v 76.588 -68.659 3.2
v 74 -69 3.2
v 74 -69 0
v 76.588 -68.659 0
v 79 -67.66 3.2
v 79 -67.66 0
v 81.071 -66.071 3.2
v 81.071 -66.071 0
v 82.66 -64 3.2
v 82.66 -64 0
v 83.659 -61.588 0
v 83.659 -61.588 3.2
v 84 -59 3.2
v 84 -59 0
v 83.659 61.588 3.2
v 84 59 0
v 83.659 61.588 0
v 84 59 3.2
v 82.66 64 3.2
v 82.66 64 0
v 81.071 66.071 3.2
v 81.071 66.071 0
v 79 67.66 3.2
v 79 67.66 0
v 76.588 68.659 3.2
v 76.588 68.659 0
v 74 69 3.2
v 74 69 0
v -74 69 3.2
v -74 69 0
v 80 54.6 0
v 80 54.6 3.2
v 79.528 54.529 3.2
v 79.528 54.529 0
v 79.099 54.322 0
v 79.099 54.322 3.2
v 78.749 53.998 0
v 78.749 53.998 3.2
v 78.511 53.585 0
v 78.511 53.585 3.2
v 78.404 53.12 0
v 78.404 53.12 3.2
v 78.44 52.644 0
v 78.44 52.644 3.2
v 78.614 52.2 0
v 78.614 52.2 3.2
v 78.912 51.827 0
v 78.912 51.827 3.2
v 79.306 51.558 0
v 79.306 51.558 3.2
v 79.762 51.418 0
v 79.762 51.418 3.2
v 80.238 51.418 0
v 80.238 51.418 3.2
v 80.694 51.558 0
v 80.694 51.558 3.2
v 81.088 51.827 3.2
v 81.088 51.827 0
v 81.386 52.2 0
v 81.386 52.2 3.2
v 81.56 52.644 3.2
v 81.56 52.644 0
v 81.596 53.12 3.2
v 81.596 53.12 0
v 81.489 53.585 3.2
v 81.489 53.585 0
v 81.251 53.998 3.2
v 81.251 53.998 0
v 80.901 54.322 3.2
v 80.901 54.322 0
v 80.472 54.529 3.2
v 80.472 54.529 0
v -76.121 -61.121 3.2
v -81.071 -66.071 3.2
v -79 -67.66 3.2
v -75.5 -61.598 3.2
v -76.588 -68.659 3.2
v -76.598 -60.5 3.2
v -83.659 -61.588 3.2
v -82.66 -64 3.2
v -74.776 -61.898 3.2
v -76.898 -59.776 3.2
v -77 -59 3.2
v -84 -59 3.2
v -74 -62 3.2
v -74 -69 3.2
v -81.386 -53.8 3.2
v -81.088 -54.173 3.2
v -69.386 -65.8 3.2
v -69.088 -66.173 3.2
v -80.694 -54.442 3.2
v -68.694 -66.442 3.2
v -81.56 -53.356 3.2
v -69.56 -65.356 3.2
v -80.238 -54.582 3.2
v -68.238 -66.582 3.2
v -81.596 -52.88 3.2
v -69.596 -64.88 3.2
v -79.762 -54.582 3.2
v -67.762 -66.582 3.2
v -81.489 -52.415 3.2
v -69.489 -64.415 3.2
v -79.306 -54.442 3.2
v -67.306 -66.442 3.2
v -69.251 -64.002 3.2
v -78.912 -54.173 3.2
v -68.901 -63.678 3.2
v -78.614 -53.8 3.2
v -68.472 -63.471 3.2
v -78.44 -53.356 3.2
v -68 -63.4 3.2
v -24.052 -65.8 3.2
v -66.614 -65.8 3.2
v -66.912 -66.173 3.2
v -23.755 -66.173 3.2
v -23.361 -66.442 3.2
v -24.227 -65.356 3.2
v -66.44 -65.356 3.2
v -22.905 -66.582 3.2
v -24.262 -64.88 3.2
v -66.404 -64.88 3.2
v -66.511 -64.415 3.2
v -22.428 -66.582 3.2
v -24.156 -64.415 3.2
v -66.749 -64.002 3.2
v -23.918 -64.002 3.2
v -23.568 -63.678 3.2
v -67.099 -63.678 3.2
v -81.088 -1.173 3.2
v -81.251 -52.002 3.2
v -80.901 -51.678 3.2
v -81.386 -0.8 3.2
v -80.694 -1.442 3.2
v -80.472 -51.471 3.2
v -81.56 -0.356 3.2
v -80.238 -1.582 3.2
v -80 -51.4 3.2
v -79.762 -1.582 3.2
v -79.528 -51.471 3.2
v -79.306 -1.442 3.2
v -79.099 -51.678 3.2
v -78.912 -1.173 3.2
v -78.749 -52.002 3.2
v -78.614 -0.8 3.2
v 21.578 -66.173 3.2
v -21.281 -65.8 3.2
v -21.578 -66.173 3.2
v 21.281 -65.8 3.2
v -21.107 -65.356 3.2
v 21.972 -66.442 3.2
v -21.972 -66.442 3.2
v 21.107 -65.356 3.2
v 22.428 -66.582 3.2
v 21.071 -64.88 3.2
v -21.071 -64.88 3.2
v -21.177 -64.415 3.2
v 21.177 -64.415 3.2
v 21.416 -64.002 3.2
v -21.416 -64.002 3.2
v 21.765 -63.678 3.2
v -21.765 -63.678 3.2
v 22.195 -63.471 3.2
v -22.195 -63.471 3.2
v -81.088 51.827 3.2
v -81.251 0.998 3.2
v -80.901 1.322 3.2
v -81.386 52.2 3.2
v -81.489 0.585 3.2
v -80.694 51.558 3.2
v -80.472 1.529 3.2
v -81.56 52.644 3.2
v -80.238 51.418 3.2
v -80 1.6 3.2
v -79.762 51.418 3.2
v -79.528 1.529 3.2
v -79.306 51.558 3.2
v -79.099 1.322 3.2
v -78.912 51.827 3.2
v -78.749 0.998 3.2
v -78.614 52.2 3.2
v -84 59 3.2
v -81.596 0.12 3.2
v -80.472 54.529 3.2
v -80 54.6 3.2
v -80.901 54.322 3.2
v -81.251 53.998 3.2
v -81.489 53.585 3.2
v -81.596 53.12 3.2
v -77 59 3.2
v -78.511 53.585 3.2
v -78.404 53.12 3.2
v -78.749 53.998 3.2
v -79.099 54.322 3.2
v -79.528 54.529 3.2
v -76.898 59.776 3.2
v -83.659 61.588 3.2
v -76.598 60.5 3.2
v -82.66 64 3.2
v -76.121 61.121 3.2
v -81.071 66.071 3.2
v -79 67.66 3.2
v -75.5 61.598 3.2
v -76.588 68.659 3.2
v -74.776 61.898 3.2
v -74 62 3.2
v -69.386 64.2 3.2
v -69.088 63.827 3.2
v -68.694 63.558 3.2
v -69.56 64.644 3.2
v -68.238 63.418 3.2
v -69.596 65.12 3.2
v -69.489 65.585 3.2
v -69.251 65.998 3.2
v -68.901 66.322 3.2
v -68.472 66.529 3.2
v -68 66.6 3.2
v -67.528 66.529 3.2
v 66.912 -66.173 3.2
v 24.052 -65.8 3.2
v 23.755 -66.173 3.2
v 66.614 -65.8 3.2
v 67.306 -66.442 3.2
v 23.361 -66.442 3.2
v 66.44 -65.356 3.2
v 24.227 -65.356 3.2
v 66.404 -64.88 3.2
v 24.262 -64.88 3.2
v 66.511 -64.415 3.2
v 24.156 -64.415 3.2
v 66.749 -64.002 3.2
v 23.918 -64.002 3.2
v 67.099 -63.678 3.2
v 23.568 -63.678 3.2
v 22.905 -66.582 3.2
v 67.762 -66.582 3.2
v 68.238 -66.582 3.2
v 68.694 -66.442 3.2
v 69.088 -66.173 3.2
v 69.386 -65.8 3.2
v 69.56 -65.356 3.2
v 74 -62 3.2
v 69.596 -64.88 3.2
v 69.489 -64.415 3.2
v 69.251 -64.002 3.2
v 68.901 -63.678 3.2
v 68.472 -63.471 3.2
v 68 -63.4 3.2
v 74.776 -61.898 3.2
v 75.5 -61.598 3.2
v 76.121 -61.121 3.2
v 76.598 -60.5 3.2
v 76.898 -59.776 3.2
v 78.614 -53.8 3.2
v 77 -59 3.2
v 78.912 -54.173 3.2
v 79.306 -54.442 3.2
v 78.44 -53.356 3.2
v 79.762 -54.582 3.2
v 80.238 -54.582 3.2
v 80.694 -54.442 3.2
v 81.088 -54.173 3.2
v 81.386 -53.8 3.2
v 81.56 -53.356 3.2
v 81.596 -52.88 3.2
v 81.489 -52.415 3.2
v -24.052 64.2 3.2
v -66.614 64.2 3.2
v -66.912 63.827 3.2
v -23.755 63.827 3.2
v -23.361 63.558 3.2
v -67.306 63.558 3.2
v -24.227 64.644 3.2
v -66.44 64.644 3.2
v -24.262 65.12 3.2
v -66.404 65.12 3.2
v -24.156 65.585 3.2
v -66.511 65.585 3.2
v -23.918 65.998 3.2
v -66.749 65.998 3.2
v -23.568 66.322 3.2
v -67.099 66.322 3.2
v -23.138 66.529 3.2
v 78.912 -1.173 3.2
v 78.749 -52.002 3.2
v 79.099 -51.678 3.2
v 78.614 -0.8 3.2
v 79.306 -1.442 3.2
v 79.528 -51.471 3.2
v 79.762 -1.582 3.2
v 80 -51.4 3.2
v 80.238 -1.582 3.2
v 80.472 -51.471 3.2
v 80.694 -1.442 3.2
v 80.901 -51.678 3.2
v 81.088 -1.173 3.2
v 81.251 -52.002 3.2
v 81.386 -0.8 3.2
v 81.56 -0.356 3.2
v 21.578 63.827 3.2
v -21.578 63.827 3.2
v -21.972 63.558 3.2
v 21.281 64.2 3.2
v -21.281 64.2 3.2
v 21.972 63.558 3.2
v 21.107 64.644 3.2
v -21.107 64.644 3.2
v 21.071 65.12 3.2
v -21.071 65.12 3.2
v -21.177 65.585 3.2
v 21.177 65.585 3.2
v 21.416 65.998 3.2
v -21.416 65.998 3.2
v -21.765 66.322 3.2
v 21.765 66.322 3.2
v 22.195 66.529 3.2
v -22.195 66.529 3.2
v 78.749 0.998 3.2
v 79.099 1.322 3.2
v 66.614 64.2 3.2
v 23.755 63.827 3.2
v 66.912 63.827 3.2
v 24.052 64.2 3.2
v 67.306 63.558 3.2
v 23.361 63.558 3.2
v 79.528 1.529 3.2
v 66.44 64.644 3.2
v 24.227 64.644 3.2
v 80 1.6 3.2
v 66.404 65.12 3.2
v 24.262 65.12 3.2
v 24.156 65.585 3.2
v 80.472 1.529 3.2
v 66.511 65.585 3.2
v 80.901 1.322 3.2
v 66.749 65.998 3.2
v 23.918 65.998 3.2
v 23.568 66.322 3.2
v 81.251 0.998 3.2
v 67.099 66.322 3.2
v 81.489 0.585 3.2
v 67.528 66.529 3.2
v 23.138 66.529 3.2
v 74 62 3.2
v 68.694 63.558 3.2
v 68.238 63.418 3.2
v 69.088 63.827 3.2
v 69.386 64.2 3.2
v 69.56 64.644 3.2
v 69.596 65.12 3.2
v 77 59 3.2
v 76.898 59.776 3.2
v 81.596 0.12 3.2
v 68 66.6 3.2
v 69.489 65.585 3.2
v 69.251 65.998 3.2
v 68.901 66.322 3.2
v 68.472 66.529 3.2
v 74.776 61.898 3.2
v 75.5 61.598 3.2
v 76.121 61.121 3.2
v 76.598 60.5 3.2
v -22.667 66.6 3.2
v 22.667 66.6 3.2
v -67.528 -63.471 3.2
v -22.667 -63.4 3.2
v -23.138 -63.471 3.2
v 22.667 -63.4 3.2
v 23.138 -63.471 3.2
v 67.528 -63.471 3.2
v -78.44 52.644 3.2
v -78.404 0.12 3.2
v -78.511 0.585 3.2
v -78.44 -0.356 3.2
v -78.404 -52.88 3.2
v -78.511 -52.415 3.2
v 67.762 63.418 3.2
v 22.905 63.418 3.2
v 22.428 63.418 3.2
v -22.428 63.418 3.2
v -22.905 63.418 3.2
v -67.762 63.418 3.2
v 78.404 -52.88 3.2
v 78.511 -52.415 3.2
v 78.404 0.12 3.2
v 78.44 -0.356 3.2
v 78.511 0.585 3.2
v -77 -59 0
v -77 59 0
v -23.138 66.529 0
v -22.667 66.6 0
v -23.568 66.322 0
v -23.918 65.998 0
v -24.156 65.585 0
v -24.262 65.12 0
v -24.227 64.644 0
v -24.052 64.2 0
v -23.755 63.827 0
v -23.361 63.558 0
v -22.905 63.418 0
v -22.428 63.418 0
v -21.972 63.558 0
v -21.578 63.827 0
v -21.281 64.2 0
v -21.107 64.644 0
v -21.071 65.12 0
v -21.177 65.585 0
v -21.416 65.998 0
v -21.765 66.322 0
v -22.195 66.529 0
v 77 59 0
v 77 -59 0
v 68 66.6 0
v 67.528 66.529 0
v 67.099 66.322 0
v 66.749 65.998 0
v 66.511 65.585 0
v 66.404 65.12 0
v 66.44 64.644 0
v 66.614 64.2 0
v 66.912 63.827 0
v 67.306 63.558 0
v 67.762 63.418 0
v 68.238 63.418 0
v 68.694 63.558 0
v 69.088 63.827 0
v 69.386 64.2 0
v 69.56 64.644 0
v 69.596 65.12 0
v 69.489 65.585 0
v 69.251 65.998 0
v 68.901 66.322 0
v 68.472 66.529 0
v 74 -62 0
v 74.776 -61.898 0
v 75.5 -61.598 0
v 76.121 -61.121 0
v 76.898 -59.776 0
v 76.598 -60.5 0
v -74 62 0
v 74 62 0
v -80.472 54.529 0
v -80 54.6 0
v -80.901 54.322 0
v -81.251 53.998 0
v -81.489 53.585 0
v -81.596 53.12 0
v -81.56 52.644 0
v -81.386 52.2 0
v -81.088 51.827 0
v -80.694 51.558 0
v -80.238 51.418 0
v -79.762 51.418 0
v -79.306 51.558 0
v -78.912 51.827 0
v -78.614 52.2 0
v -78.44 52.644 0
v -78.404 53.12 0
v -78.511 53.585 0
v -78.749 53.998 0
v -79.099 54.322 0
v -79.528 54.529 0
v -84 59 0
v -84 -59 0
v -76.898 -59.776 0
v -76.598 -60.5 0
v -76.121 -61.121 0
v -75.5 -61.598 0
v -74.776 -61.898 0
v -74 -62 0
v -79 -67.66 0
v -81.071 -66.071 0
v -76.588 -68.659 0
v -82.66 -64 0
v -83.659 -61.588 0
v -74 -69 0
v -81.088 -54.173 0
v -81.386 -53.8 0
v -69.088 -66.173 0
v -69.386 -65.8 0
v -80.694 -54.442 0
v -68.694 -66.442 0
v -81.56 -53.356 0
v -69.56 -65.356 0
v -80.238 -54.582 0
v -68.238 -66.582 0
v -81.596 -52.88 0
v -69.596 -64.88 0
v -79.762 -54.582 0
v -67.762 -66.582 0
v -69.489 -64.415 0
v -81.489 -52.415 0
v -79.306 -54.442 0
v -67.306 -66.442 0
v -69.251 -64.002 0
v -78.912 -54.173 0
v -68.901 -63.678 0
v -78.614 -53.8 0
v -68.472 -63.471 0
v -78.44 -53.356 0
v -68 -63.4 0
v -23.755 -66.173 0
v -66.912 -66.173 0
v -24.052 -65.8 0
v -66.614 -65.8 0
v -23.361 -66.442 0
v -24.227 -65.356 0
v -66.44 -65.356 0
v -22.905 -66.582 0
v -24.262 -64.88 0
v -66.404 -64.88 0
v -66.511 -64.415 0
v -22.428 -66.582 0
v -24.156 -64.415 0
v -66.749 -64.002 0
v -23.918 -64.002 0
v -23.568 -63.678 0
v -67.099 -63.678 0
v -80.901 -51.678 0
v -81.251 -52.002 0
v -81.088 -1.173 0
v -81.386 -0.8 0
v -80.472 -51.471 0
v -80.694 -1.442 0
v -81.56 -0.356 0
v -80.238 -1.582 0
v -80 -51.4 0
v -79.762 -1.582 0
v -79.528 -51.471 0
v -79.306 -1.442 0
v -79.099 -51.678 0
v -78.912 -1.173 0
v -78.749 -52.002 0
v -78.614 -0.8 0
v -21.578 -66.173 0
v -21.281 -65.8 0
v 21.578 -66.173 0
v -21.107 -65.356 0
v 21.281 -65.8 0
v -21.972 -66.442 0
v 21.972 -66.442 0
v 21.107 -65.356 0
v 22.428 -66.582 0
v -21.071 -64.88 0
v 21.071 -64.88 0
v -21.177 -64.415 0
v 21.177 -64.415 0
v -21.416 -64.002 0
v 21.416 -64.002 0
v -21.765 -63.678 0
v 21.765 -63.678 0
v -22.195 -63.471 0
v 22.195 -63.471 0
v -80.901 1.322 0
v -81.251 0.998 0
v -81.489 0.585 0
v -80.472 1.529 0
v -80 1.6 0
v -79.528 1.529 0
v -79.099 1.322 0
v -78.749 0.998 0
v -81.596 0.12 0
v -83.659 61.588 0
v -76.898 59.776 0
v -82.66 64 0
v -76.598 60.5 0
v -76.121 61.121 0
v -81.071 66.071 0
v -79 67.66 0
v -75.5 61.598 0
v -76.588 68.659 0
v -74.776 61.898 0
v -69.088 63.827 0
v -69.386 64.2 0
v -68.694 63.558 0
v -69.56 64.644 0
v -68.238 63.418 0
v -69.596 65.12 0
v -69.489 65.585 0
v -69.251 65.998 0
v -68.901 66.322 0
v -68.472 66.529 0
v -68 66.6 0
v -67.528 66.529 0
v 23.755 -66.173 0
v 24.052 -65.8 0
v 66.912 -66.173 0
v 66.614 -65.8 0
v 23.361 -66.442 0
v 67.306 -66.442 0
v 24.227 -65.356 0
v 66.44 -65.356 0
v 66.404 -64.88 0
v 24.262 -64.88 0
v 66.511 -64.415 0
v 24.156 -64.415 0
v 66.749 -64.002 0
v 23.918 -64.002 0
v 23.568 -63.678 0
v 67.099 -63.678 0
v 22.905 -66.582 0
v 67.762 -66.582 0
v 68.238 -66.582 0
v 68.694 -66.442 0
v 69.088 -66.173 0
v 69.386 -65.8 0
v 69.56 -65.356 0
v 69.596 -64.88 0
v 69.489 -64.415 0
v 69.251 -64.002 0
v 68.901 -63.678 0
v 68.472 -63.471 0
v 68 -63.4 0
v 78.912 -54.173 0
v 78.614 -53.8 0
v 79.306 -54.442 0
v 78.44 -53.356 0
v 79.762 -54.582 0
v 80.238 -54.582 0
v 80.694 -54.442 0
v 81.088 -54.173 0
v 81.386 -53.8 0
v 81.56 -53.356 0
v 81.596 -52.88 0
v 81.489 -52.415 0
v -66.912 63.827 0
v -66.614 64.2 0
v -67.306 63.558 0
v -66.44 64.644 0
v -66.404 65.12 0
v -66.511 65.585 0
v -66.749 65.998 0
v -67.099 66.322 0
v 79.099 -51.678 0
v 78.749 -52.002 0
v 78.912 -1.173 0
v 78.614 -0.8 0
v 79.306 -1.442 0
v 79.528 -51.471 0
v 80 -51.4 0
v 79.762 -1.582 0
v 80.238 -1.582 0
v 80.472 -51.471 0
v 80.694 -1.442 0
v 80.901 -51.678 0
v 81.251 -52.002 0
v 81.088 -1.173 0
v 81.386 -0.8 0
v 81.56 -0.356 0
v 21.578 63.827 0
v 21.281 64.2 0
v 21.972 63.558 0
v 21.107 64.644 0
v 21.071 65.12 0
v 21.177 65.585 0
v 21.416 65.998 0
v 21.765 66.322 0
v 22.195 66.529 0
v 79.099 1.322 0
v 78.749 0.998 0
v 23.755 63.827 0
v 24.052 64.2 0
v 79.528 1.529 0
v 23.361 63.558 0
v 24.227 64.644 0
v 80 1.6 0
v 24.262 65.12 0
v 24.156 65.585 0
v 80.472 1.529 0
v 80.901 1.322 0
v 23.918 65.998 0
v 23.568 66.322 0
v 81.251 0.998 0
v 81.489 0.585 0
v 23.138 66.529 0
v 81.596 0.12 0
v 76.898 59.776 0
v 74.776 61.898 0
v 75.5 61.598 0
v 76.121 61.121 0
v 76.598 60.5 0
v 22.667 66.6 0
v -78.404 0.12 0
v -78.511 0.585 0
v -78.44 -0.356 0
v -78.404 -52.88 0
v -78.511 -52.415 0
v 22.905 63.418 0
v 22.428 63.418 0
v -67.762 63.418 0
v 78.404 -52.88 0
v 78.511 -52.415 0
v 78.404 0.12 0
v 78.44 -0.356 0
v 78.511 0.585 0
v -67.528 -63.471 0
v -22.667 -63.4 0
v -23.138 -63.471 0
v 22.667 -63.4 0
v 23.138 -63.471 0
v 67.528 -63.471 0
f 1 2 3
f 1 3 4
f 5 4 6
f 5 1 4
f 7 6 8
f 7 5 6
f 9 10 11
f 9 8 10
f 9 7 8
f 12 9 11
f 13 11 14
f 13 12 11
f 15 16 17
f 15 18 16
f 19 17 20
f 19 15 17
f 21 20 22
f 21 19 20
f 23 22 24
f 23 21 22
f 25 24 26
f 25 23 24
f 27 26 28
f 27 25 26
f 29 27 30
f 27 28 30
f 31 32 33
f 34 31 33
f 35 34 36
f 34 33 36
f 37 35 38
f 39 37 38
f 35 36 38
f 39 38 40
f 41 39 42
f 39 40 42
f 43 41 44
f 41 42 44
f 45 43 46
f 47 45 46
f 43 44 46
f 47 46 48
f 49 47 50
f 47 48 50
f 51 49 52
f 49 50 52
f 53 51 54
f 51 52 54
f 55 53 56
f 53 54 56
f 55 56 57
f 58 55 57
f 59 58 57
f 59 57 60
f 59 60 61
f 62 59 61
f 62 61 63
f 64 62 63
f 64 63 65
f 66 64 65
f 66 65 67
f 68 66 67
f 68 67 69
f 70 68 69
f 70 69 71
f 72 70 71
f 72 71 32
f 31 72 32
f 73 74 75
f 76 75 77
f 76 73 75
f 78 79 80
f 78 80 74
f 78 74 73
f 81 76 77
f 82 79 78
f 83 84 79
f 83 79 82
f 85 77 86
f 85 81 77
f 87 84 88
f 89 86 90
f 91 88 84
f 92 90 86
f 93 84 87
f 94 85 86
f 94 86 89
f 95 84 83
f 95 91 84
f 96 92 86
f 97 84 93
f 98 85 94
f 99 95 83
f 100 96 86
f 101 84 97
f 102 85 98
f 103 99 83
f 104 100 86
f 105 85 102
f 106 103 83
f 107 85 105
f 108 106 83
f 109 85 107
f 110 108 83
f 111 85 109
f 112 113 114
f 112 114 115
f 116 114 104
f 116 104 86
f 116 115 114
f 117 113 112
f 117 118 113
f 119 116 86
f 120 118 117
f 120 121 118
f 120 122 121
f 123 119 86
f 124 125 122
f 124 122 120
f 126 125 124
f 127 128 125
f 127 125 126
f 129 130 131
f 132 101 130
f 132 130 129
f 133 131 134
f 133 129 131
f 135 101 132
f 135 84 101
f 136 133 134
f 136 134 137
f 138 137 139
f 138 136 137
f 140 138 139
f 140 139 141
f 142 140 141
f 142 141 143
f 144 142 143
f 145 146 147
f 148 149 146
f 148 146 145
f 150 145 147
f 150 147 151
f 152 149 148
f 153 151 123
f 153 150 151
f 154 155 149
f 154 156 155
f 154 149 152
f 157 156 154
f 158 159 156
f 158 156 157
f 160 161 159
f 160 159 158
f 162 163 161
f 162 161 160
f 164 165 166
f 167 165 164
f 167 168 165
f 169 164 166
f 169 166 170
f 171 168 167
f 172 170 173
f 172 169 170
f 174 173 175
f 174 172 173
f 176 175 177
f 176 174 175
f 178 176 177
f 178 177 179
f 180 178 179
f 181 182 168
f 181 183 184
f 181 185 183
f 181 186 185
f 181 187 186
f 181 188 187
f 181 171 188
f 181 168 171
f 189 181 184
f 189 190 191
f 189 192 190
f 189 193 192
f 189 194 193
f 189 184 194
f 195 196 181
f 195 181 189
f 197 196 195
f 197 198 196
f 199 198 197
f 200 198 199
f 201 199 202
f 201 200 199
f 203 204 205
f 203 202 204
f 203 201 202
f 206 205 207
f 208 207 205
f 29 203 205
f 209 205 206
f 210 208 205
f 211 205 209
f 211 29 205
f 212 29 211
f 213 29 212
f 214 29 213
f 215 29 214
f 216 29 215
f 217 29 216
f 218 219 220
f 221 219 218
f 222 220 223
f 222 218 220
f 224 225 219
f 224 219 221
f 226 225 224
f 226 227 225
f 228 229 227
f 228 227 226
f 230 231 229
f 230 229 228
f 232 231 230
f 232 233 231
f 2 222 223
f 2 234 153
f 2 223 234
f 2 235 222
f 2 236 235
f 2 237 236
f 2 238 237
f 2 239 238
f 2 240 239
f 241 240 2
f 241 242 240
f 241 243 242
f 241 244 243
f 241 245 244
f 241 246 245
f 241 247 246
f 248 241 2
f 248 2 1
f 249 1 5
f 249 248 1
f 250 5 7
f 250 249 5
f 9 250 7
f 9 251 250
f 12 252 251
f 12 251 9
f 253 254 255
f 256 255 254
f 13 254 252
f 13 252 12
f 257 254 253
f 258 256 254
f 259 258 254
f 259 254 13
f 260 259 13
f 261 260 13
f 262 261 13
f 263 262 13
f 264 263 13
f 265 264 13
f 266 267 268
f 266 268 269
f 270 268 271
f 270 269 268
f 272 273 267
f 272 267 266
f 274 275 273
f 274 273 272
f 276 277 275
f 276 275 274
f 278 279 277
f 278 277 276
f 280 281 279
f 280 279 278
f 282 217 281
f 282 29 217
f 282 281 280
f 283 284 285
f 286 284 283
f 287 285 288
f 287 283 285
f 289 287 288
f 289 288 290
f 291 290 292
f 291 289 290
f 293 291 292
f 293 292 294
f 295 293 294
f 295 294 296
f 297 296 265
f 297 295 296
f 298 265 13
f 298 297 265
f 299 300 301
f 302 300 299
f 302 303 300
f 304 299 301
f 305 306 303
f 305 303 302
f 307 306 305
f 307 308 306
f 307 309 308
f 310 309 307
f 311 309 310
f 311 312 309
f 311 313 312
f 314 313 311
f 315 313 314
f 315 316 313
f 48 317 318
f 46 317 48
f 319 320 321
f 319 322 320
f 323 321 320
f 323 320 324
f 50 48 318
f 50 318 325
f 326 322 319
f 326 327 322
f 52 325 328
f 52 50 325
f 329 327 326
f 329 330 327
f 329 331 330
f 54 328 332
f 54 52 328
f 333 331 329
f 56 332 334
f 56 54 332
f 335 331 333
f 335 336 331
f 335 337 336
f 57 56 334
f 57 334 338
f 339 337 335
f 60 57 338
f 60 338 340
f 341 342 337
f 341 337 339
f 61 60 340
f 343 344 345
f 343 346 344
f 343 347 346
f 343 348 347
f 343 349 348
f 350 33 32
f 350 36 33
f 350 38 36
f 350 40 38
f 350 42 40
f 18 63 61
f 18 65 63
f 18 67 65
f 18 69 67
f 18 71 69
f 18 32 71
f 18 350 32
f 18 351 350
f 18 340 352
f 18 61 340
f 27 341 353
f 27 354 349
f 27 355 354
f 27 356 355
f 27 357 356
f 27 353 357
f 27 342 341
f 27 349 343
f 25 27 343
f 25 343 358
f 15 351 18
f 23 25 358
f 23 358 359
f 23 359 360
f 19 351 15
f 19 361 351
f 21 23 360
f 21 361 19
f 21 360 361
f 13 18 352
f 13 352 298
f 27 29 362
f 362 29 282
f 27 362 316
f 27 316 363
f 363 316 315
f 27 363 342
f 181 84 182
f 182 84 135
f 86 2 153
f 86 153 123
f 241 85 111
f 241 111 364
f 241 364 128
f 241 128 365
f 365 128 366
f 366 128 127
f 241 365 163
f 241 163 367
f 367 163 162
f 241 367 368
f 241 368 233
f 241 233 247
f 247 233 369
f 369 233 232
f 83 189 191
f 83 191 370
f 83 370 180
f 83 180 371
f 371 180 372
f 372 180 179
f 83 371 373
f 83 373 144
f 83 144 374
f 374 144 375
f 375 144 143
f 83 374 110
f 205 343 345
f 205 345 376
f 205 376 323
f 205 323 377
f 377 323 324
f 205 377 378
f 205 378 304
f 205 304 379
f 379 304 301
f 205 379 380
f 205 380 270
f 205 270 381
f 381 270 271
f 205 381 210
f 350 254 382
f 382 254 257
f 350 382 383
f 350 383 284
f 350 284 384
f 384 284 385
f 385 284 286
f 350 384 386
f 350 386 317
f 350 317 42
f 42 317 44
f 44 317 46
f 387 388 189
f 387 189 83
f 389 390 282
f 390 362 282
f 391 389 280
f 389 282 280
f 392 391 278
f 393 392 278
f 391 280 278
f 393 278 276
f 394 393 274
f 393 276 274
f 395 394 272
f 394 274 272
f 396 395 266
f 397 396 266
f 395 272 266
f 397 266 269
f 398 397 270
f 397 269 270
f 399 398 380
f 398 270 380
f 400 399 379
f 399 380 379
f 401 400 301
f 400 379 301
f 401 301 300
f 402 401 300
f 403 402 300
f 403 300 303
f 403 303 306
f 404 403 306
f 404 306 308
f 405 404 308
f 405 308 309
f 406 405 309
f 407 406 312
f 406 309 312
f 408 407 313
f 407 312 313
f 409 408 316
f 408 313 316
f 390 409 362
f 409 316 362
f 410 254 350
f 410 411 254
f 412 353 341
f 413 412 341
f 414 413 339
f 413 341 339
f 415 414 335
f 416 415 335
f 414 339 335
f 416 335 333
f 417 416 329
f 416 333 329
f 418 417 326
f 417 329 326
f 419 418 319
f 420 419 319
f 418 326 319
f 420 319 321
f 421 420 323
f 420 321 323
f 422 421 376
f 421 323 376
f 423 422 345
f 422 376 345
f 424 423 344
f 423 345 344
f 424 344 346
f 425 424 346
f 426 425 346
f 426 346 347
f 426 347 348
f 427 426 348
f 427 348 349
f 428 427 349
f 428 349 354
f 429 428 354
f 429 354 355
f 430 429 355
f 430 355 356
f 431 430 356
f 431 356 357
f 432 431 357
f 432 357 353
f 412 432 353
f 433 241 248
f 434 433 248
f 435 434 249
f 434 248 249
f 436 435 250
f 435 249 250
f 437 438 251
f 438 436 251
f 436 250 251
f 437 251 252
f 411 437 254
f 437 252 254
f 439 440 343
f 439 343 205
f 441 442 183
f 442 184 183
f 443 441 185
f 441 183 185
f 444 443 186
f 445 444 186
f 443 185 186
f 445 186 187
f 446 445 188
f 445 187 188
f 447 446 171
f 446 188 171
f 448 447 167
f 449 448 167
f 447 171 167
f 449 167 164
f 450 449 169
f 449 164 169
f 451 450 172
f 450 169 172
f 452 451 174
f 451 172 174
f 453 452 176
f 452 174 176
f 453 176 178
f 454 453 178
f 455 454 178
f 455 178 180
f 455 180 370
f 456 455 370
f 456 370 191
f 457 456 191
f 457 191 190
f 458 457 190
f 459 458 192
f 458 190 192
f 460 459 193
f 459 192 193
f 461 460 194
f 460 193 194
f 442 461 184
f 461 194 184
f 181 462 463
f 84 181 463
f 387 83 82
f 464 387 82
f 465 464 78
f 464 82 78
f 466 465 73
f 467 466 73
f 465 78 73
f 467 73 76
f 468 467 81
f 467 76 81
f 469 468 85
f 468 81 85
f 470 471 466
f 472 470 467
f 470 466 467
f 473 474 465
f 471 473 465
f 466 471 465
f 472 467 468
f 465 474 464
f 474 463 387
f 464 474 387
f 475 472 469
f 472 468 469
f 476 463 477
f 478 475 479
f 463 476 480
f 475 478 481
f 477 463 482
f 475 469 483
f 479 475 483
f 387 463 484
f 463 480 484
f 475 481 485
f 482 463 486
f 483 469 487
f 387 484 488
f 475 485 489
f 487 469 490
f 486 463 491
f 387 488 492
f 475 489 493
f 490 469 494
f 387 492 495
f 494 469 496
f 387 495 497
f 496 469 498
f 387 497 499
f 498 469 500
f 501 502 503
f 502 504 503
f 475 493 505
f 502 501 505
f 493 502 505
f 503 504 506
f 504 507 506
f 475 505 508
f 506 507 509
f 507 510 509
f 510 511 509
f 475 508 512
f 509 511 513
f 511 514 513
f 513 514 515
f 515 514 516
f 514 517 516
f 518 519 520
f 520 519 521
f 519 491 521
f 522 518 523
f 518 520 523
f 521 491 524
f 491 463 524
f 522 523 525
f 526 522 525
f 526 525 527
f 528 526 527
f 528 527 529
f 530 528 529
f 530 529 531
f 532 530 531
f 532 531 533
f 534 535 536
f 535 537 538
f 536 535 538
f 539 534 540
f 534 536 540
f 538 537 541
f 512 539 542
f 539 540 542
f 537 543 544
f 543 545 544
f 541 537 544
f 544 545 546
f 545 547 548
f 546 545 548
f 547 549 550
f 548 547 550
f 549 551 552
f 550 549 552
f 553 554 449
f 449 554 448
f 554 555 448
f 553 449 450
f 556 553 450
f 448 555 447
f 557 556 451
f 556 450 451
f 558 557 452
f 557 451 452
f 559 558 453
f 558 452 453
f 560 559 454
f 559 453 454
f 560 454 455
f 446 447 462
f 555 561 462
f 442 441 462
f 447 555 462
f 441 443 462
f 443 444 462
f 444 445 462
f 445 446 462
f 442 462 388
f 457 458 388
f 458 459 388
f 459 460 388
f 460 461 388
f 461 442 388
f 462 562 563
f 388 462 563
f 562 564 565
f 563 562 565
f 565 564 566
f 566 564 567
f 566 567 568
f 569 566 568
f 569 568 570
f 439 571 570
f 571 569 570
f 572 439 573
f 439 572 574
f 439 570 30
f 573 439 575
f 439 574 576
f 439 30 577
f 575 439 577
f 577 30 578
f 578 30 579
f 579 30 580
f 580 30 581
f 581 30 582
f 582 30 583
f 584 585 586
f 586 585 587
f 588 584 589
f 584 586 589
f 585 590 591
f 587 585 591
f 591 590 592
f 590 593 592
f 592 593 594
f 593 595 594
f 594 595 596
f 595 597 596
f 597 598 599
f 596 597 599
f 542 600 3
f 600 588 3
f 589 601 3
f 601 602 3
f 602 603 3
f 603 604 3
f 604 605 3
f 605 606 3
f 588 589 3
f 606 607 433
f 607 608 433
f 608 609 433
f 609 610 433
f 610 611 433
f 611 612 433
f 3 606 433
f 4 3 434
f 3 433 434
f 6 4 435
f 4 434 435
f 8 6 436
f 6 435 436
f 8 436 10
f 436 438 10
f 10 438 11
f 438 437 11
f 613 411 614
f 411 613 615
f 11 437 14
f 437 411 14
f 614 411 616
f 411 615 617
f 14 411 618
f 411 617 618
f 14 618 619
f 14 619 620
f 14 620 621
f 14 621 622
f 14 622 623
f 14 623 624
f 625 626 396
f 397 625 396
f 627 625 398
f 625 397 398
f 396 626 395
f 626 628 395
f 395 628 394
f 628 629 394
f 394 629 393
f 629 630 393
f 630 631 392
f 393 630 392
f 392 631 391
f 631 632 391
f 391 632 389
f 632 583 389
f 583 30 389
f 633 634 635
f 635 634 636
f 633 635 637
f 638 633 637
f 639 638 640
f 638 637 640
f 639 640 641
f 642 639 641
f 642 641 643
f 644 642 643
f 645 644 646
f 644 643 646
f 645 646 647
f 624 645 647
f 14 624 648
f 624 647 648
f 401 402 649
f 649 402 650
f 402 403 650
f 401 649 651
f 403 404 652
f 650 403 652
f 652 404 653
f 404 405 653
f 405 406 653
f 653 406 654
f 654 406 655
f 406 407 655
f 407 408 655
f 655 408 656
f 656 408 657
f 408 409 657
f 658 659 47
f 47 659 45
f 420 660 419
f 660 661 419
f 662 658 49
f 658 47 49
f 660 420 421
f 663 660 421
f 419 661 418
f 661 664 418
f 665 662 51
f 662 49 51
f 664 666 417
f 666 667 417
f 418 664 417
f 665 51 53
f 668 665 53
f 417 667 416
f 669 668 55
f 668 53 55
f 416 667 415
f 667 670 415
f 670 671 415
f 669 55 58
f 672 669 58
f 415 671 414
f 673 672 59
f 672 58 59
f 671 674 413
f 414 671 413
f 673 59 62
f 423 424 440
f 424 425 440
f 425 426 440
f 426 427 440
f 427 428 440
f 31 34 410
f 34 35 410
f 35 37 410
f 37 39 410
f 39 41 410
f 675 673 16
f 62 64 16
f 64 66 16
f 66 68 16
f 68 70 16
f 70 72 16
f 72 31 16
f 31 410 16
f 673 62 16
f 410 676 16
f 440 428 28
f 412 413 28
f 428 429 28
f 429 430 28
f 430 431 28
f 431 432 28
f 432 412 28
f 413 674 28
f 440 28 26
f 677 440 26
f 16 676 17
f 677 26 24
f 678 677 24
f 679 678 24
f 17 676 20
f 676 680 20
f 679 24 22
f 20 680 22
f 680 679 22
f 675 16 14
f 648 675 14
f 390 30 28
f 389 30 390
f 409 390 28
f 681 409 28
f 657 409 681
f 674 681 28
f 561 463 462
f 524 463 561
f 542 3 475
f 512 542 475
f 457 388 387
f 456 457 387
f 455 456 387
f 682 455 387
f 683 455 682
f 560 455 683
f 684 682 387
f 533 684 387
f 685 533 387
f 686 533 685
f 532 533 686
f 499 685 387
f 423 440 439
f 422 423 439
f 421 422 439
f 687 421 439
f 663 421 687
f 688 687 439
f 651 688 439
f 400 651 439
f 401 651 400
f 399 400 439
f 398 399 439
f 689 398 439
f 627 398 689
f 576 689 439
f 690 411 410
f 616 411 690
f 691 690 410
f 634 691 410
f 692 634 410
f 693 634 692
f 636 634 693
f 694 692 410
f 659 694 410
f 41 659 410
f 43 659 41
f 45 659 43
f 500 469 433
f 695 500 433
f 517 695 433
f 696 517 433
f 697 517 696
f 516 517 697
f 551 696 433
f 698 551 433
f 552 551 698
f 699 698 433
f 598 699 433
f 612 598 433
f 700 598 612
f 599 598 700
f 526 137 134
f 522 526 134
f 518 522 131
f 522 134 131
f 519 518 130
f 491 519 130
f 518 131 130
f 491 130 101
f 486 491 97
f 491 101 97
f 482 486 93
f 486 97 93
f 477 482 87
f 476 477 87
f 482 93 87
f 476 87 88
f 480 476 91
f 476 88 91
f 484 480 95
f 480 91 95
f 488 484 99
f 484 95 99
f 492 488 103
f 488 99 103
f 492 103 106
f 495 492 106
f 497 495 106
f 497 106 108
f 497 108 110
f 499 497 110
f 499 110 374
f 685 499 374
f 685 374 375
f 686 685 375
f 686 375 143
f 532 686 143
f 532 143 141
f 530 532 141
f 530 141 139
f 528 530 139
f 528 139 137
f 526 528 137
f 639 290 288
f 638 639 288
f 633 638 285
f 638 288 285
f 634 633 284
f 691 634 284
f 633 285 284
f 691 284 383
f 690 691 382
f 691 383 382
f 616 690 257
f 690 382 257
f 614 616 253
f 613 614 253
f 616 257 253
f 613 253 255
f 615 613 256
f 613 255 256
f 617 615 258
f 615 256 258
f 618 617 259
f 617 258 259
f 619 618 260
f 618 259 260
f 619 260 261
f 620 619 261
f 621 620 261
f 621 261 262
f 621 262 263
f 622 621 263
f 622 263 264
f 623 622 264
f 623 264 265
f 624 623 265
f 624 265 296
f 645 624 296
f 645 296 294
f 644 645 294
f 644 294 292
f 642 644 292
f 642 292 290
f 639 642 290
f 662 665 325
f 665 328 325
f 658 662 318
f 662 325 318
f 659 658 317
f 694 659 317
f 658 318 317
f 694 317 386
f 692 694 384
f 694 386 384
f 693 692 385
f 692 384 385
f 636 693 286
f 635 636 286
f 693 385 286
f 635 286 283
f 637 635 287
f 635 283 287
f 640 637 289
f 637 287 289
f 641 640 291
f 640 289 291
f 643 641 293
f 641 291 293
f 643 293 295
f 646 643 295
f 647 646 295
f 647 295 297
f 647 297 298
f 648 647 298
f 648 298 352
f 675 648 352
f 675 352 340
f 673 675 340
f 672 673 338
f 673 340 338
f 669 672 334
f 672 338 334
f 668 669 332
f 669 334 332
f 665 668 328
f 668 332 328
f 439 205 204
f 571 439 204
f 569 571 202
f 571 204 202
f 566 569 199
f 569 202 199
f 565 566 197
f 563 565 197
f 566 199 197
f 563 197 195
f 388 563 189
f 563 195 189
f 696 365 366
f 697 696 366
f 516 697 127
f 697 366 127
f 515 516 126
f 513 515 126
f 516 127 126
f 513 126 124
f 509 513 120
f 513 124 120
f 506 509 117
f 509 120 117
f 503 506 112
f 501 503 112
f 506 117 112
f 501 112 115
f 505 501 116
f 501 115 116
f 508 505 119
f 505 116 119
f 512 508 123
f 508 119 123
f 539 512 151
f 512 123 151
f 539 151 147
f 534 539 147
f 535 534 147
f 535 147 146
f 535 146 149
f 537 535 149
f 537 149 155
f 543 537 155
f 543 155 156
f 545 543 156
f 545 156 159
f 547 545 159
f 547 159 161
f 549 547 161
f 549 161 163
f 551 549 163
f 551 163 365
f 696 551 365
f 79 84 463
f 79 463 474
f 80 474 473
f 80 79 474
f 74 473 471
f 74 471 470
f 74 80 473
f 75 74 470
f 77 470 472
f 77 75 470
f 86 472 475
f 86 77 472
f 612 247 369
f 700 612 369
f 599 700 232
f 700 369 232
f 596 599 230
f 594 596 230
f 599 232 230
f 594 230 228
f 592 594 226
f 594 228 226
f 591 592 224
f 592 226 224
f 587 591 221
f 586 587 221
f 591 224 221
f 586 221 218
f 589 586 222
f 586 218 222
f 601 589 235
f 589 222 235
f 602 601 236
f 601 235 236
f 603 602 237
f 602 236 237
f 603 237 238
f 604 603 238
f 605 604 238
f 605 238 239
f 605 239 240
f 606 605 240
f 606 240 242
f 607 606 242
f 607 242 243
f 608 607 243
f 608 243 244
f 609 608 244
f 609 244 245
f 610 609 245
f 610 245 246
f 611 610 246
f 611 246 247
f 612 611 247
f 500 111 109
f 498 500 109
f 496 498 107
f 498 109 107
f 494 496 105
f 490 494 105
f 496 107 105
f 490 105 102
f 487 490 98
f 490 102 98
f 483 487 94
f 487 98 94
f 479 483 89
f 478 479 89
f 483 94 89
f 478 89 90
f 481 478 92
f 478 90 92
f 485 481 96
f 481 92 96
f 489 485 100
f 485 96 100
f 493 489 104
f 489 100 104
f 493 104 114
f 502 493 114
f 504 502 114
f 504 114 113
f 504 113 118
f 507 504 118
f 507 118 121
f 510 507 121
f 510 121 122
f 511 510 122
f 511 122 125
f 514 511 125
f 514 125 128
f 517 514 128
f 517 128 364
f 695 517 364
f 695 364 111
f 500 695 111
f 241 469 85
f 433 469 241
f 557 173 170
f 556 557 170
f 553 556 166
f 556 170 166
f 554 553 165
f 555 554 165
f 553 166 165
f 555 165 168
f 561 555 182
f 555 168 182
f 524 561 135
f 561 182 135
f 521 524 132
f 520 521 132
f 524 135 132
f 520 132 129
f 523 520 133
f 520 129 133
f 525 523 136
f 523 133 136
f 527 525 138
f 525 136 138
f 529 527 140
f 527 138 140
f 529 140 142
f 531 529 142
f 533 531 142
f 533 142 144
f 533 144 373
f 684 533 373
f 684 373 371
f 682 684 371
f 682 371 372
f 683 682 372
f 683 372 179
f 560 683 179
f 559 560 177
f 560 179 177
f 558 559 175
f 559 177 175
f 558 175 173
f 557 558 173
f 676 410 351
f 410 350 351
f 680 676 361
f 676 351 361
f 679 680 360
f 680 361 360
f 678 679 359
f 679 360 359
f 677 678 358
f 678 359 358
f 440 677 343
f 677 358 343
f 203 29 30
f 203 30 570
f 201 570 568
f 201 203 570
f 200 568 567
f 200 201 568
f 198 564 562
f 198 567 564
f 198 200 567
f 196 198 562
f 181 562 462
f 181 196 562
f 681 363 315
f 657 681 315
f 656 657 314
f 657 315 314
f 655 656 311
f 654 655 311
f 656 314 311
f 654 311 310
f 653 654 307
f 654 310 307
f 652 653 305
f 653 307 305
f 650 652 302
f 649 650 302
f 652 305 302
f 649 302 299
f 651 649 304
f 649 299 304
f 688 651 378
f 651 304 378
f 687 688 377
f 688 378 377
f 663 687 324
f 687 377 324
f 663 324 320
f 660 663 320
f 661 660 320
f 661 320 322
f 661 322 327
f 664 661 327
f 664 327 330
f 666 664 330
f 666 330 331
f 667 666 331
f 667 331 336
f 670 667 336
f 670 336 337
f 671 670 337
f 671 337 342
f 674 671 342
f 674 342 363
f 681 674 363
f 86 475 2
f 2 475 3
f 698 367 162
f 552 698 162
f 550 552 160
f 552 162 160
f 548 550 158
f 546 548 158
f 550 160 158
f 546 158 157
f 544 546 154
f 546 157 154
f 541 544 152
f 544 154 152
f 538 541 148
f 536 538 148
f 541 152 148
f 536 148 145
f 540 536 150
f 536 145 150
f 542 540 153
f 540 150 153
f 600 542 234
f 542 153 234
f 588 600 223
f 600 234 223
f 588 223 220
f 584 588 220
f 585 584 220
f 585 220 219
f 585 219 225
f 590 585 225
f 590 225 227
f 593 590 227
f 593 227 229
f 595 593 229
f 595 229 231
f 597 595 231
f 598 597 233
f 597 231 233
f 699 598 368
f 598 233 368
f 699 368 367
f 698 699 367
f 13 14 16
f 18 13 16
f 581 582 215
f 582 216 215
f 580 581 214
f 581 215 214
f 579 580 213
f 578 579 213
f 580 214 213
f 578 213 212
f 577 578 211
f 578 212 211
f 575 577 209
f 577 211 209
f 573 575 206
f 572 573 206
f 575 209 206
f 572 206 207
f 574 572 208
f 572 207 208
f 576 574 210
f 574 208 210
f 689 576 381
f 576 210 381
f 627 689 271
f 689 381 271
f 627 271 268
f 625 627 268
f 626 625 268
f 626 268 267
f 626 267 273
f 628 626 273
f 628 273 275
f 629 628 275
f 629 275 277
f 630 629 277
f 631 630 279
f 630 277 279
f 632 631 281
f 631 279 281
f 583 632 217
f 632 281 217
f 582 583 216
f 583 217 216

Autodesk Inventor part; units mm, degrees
ref_plane "YZ Plane" through (0, 0, 0) normal (1, 0, 0) x (0, 1, 0)
ref_plane "XZ Plane" through (0, 0, 0) normal (0, 1, 0) x (-1, 0, 0)
ref_plane "XY Plane" through (0, 0, 0) normal (0, 0, 1) x (1, 0, 0)
sketch "Sketch1" plane through (0, 0, 0) normal (0, 0, 1) x (1, 0, 0)
  line L0 (-76, 61) -> (76, 61)
  line L1 (76, 61) -> (76, -61)
  line L2 (76, -61) -> (-76, -61)
  line L3 (-76, -61) -> (-76, 61)
  line L4 (-69.5, 55) -> (69.5, 55)
  line L5 (69.5, 55) -> (69.5, -55)
  line L6 (69.5, -55) -> (-69.5, -55)
  line L7 (-69.5, -55) -> (-69.5, 55)
  line L8 (84, 69) -> (-84, 69)
  line L9 (-84, 69) -> (-84, -69)
  line L10 (-84, -69) -> (84, -69)
  line L11 (84, -69) -> (84, 69)
  line L12 (72.5, 58) -> (-72.5, 58)
  line L13 (-72.5, 58) -> (-72.5, -58)
  line L14 (-72.5, -58) -> (72.5, -58)
  line L15 (72.5, -58) -> (72.5, 58)
  line L16 (0, 109.6961) -> (0, -131.8013)
  line L17 (-145.0248, 0) -> (154.2595, 0)
  line L18 (77, -62) -> (77, 62)
  line L19 (77, 62) -> (-77, 62)
  line L20 (-77, 62) -> (-77, -62)
  line L21 (-77, -62) -> (77, -62)
  point P0 (0, 0)
  point P1 (-68, -65)
  point P2 (-80, -53)
  point P3 (-22.6667, -65)
  point P4 (22.6667, -65)
  point P5 (68, -65)
  point P6 (-80, 0)
  point P7 (-80, 53)
  point P8 (80, -53)
  point P9 (80, 0)
  point P10 (80, 53)
  point P11 (-68, 65)
  point P12 (-22.6667, 65)
  point P13 (22.6667, 65)
  point P14 (68, 65)
  dimension "d0" = 152
  dimension "d1" = 122
  dimension "d2" = 139
  dimension "d3" = 110
  dimension "d4" = 6
  dimension "d5" = 6.5
  dimension "d6" = 8
  dimension "d7" = 3
  dimension "d44" = 69.5
  dimension "d45" = 55
  dimension "d84" = 4
  dimension "d85" = 4
  dimension "d87" = 16
  dimension "d88" = 16
  dimension "d89" = 168
  dimension "d90" = 138
  dimension "d93" = 45.3333
  dimension "d100" = 53
  dimension "d119" = 1
extrude "Extrusion1" add sketch "Sketch1" along normal blind 3.2 contours L19 L20 L17 L9 L8 L16 | L16 L8 L11 L17 L18 L19 | L20 L21 L16 L10 L9 L17 | L17 L11 L10 L16 L21 L18
fillet "Fillet8" radius 10 4 edges at (-84, -69, 1.6) (84, -69, 1.6) (84, 69, 1.6) (-84, 69, 1.6)
hole "Hole2" at (-68, -65, 0) at (-80, -53, 0) at (-22.6667, -65, 0) at (22.6667, -65, 0) at (68, -65, 0) at (-80, 0, 0) at (-80, 53, 0) at (80, 53, 0) at (80, 0, 0) at (80, -53, 0) at (-68, 65, 0) at (-22.6667, 65, 0) at (22.6667, 65, 0) at (68, 65, 0) direction (0, 0, 1) diameter 3.2 depth 3.2
fillet "Fillet9" radius 3 4 edges at (77, 62, 1.6) (-77, 62, 1.6) (-77, -62, 1.6) (77, -62, 1.6)
equation "\"d4\" = -0.5 * d3 + 0.5 * d1"
equation "\"d5\" = -0.5 * d2 + 0.5 * d0"
equation "\"d44\" = 0.5 * d2"
equation "\"d45\" = 0.5 * d3"
equation "\"d84\" = 0.5 * d6"
equation "\"d85\" = d84"
equation "\"d88\" = d87"
equation "\"d93\" = -0.666667 * d87 + 0.333333 * d89"
equation "\"d100\" = -d88 + 0.5 * d90"
properties part number "3DP_PLA_Front_filter_mount_hood_spacer"
